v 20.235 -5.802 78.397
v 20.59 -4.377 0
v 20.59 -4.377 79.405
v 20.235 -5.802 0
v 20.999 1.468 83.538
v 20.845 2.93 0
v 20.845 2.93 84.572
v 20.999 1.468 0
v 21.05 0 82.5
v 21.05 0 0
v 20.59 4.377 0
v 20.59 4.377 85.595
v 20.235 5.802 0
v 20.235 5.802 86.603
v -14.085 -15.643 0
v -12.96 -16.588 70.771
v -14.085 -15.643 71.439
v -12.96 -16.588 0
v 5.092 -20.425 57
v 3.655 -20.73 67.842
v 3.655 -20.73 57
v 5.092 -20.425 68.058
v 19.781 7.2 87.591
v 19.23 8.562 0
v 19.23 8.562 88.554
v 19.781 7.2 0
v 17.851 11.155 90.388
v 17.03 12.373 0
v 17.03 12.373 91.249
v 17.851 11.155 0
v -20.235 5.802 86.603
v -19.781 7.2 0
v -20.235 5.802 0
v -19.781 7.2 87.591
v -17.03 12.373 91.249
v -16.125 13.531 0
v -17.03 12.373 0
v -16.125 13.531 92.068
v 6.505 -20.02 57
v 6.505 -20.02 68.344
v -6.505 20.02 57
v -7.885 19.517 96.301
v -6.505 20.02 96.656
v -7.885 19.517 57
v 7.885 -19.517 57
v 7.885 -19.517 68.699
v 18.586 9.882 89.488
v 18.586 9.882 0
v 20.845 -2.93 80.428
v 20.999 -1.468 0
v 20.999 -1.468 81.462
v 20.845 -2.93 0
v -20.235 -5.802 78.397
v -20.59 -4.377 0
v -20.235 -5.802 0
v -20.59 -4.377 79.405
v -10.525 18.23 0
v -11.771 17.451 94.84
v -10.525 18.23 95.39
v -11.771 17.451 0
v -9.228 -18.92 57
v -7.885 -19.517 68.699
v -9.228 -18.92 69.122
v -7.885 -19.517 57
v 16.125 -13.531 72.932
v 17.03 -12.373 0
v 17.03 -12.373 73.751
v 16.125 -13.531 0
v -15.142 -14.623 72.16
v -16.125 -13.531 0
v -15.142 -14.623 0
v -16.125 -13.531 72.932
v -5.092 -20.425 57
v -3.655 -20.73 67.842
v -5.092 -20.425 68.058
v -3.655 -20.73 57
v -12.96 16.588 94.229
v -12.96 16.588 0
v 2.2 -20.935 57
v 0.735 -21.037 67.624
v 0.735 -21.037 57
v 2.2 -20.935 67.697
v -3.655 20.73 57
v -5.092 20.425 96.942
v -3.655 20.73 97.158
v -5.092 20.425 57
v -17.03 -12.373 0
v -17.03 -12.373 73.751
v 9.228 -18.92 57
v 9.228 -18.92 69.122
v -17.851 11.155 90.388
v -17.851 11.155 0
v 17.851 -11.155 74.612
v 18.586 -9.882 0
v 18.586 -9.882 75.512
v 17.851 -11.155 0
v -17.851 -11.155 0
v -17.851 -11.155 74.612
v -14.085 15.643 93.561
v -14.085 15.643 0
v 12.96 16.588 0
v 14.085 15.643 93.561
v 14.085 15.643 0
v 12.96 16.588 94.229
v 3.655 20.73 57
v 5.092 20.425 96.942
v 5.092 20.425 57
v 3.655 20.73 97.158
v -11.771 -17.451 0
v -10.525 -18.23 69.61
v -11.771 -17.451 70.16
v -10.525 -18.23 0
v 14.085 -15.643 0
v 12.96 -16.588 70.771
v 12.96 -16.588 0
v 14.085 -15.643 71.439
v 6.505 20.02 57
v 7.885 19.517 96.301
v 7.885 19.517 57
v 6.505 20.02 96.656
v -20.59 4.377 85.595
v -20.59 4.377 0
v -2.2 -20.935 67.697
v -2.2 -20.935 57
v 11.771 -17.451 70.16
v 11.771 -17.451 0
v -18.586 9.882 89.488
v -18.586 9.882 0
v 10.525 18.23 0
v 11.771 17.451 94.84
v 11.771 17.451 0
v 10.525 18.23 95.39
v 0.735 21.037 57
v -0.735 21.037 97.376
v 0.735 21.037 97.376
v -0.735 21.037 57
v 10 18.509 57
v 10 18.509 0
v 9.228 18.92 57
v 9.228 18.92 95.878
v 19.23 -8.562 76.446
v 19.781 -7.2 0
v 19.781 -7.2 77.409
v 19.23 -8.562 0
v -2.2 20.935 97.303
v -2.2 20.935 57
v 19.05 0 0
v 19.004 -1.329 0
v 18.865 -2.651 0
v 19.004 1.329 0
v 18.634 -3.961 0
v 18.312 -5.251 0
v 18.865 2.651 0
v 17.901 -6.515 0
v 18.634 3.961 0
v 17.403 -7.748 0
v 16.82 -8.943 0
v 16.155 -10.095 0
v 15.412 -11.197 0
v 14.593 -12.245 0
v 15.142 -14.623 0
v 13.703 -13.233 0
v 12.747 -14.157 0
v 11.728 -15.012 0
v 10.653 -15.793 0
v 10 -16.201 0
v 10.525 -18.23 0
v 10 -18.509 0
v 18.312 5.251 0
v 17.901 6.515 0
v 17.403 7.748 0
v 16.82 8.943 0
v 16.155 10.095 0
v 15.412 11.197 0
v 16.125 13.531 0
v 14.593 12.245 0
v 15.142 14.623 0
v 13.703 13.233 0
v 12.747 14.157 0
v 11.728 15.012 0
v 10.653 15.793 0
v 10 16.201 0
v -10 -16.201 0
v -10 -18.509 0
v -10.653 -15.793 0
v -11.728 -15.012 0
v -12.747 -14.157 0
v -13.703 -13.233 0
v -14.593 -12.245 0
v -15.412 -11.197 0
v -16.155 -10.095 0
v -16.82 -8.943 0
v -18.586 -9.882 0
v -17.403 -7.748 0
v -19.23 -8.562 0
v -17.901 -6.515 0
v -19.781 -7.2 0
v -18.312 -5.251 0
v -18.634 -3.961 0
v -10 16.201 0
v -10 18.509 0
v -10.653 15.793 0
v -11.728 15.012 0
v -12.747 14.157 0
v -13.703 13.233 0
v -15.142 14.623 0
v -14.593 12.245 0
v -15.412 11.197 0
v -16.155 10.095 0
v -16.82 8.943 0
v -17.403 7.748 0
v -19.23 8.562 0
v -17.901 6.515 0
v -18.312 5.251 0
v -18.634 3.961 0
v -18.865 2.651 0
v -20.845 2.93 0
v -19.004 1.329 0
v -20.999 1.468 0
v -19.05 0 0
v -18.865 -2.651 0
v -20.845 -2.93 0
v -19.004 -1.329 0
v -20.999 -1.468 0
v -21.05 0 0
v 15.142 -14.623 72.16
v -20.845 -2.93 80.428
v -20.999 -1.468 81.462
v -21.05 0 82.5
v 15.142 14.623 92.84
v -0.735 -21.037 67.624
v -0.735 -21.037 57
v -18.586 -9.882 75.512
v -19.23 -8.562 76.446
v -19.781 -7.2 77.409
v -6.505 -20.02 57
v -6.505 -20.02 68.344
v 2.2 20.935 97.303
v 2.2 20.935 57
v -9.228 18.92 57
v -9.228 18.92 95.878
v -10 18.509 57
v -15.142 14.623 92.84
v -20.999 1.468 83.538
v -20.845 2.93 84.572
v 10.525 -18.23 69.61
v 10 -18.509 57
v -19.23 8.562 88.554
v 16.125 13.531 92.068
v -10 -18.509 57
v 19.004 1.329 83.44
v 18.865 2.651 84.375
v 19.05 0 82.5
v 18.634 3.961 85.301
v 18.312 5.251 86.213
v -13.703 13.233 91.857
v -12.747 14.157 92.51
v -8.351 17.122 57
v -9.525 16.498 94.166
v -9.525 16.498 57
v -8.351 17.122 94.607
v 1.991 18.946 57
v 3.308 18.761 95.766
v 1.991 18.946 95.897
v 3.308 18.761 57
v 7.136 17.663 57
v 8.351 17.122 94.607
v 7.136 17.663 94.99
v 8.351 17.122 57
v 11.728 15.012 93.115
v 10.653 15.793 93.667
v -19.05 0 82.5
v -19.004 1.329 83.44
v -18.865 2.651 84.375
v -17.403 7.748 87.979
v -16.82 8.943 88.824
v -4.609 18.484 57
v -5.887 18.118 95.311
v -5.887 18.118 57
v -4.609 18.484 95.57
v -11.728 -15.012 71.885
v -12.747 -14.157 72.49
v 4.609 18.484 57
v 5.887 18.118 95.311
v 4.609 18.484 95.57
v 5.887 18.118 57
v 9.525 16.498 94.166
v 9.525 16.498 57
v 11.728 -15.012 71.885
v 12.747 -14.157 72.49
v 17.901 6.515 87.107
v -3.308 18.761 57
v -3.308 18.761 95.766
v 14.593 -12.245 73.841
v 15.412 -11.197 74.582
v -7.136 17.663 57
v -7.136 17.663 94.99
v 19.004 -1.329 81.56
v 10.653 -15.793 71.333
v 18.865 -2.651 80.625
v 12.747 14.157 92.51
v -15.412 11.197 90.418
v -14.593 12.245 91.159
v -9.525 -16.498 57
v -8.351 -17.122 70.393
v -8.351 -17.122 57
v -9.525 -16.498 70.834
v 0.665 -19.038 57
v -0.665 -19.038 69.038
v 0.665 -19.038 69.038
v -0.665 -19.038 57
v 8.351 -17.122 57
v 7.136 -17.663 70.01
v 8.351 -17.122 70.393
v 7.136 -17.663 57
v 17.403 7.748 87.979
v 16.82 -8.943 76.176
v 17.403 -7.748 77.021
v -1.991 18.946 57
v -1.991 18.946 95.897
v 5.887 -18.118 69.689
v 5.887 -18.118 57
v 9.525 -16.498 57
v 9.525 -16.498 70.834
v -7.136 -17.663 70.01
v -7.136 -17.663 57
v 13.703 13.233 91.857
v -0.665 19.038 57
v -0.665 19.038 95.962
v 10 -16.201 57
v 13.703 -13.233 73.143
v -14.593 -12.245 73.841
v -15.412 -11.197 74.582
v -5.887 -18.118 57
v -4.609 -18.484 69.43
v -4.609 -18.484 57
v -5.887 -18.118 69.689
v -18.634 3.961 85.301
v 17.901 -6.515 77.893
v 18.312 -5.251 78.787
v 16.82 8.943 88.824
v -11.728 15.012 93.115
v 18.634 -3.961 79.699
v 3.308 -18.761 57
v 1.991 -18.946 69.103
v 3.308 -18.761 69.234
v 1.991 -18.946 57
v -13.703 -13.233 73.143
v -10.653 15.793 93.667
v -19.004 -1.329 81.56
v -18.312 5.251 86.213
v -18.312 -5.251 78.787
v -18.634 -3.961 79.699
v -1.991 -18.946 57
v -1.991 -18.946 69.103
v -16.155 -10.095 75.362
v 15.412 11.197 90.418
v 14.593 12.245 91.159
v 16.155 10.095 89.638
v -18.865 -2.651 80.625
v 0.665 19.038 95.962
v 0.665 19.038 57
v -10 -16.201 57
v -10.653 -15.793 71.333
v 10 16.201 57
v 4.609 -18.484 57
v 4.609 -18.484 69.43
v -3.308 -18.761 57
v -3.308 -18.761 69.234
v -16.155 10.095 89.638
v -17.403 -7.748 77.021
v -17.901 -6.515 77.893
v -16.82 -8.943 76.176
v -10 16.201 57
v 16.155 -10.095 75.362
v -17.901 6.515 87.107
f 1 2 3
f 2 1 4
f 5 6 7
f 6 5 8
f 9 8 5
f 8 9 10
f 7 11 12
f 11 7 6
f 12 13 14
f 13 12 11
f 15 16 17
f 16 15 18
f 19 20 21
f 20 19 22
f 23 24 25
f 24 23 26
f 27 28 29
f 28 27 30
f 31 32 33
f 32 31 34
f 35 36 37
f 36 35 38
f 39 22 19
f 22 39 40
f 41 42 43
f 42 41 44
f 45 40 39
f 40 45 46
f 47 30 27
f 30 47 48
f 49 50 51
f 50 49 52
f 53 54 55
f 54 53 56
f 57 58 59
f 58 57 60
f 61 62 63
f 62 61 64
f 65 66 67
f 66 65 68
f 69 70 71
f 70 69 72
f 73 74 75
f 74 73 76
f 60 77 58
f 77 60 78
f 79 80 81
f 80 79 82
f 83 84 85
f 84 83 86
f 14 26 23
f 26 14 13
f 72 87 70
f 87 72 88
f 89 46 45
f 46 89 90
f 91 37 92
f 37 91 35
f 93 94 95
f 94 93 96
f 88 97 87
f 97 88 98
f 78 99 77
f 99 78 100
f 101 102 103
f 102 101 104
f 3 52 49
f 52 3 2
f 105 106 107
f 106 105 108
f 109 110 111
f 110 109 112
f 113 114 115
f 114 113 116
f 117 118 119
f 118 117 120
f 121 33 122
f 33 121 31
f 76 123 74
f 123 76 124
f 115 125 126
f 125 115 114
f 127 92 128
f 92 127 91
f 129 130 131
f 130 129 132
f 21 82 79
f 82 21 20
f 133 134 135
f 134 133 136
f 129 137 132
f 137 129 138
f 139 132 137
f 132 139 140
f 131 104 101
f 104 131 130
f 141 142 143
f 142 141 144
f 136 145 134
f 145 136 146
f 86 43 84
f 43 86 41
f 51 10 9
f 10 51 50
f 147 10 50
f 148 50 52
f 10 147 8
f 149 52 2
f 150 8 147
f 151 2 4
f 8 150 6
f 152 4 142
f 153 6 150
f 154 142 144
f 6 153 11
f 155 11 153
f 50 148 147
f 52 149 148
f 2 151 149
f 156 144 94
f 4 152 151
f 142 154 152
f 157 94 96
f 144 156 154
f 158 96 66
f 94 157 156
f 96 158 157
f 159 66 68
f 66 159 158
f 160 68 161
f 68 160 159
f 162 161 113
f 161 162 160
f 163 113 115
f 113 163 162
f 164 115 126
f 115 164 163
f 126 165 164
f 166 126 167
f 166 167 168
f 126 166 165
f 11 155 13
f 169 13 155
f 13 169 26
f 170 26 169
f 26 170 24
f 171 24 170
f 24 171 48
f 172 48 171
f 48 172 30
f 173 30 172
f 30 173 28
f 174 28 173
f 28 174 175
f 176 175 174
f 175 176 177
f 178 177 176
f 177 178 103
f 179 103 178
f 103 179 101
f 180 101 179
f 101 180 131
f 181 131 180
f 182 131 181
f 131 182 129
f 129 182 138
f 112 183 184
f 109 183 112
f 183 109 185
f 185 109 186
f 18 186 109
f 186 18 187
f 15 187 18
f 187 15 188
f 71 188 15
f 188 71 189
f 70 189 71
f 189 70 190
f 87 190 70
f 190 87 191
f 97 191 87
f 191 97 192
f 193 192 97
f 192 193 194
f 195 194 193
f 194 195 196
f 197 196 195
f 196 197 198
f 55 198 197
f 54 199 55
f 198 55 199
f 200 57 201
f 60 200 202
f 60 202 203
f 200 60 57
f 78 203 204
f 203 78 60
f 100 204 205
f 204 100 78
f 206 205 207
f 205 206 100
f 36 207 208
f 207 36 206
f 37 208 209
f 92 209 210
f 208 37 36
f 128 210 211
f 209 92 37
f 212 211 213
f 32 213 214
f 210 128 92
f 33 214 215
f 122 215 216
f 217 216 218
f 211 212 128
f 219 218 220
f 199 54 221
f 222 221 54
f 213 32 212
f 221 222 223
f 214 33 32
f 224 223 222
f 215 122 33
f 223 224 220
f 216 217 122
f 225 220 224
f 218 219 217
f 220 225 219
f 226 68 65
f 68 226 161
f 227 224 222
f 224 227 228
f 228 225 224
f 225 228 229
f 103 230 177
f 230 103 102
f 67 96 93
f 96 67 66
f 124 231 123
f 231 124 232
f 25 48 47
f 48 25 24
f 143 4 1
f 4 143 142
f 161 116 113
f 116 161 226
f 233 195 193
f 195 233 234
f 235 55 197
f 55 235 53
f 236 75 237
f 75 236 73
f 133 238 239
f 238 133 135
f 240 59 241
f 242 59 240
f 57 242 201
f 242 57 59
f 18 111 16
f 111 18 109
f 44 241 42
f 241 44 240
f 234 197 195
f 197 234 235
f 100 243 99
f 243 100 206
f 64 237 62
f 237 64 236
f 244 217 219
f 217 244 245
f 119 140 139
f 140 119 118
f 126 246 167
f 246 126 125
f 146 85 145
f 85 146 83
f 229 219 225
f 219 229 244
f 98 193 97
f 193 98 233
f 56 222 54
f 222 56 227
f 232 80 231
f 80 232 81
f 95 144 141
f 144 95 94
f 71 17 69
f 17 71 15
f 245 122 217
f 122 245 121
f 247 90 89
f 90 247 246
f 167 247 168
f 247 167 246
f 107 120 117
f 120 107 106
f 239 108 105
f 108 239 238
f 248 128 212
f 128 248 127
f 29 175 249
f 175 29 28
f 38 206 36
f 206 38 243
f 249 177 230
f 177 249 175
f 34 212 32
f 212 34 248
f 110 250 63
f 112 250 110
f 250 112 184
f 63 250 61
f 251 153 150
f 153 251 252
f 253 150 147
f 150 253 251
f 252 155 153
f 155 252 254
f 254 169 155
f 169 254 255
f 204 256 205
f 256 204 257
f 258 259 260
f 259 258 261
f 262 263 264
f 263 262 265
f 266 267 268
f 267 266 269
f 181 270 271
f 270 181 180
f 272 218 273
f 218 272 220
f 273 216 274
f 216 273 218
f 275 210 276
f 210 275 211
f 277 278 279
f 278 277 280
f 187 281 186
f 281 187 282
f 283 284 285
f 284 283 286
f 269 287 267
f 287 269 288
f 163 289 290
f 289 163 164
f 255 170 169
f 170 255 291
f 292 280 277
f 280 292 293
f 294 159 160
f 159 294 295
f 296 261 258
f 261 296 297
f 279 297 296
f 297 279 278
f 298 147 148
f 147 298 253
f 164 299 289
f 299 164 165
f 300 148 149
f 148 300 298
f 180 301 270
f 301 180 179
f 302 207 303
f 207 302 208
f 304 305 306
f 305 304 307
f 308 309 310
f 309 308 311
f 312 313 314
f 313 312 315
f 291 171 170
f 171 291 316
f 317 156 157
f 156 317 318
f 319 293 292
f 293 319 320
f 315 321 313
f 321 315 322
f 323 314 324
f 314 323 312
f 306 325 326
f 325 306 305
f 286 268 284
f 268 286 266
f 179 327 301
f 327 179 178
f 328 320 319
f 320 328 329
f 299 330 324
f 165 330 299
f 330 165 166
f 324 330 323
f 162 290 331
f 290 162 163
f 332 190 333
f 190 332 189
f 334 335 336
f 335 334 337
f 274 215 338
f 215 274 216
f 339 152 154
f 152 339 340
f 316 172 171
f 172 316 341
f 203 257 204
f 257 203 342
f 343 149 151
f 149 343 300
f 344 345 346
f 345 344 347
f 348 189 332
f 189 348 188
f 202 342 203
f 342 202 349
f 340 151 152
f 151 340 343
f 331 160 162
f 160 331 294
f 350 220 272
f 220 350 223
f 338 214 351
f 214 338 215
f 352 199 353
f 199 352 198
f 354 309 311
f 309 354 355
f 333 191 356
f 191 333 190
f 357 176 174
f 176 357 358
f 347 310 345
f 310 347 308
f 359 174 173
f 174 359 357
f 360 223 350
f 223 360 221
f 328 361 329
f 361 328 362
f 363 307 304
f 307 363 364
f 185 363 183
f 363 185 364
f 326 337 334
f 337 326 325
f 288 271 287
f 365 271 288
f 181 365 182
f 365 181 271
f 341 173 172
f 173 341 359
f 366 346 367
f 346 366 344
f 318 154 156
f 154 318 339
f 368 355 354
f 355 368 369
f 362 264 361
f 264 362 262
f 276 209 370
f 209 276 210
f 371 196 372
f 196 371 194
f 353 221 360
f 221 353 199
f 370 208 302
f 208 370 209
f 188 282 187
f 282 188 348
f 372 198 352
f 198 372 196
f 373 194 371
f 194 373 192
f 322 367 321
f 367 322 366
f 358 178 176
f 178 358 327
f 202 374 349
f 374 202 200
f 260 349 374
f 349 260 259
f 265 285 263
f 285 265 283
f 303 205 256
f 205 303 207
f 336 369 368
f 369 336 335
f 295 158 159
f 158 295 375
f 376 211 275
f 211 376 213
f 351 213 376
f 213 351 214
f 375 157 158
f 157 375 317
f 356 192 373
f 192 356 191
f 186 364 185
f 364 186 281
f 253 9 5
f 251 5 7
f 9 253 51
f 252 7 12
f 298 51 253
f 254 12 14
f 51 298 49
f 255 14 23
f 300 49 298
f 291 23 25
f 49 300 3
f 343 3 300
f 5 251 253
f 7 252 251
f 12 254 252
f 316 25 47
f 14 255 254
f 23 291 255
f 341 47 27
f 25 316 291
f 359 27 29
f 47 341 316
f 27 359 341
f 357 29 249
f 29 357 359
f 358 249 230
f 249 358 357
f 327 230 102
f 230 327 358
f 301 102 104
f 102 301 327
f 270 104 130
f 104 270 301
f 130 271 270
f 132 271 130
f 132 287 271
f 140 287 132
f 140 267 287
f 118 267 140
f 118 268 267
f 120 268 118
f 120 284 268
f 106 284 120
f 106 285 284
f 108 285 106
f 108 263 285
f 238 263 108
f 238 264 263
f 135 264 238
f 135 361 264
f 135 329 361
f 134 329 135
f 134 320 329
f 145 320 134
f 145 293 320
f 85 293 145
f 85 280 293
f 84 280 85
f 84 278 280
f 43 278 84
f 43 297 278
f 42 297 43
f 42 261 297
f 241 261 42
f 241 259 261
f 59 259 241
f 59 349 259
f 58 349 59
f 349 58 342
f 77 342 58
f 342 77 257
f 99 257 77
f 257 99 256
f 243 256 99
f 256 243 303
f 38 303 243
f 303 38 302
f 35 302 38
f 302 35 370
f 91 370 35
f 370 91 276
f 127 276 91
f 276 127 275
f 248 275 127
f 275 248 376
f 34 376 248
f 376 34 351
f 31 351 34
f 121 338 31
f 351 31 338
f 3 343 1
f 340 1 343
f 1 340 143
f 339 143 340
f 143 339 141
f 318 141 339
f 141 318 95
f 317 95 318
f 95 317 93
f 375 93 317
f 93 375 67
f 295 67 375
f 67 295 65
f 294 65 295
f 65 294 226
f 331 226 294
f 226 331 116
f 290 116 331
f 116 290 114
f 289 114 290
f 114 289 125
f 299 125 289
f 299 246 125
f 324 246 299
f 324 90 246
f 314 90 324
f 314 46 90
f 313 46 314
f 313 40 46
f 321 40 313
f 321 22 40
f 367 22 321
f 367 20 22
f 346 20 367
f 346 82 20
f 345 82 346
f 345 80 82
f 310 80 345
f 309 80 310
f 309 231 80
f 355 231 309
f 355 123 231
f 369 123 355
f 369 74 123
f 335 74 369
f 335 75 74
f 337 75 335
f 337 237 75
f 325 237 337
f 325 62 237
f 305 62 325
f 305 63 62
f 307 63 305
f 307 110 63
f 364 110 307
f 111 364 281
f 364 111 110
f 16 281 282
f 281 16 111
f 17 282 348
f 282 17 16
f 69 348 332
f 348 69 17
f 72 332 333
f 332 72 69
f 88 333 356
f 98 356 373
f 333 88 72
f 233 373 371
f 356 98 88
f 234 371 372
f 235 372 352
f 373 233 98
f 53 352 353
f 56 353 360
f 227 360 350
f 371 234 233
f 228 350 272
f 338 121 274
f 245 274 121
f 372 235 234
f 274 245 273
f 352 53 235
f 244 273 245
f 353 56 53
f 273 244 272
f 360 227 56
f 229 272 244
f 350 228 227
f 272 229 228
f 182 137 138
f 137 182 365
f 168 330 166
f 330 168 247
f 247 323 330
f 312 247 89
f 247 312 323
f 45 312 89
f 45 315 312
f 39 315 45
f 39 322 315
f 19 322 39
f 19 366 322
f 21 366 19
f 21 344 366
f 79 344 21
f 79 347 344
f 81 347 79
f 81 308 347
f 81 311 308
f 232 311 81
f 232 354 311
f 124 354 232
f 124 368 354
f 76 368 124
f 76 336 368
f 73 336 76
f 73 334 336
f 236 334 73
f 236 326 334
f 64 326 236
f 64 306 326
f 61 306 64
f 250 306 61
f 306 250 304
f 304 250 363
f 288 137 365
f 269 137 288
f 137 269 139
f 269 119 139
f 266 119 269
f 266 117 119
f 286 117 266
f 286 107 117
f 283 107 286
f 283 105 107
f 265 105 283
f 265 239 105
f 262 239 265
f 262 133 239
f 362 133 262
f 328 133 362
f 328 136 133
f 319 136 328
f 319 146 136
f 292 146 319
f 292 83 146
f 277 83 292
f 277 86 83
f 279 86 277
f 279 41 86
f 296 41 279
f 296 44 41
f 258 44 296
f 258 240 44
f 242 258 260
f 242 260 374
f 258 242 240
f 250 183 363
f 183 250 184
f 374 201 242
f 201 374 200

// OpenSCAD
orig_barrel_len=82.5;
orig_barrel_dia=38.1;
thickness=2;
inset_width=20;
inset_len=57;
angle_degs=45;

outer_dia=orig_barrel_dia + 2*thickness;
inner_dia=orig_barrel_dia;
triangle_height=sin(angle_degs)*outer_dia;
bottom_len=orig_barrel_len - triangle_height/2;
top_len=orig_barrel_len + triangle_height/2;

$fn=90;

difference () {
    intersection() {
        difference() {
            cylinder(top_len, d=outer_dia);
            translate([0,0,-1]) {
                cylinder(top_len + 2, d=inner_dia);
            }
        }

        polyhedron(
            [
                [-outer_dia/2, -outer_dia/2, 0],
                [outer_dia/2, -outer_dia/2, 0],
                [outer_dia/2, outer_dia/2, 0],
                [-outer_dia/2, outer_dia/2, 0],
                [-outer_dia/2, -outer_dia/2, bottom_len],
                [outer_dia/2, -outer_dia/2, bottom_len],
                [outer_dia/2, outer_dia/2, top_len],
                [-outer_dia/2, outer_dia/2, top_len],
             ],
             [
                [0,1,2,3],
                [4,5,1,0],
                [7,6,5,4],
                [5,6,2,1],
                [6,7,3,2],
                [7,4,0,3],
             ]
        );
    }

    translate([-inset_width/2, -(outer_dia + 2)/2, -1]) {
        cube([inset_width,outer_dia + 2, inset_len + 1]);
    }
}
